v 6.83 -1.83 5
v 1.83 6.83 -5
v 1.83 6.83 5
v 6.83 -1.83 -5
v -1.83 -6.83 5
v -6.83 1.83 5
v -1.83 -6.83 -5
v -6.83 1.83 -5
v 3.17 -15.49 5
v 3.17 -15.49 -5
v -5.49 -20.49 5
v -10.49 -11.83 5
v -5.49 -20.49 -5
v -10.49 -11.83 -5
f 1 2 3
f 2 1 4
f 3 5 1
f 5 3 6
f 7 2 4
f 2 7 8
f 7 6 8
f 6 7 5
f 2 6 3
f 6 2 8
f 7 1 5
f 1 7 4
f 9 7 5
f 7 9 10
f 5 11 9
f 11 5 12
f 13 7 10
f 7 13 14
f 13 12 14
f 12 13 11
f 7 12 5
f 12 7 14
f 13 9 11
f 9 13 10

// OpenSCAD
difference() {
    rotate([0,0,+30]) {
        cube(10, center=true);
        translate([-10,-10,0])
            cube(10, center=true);
    }
}
